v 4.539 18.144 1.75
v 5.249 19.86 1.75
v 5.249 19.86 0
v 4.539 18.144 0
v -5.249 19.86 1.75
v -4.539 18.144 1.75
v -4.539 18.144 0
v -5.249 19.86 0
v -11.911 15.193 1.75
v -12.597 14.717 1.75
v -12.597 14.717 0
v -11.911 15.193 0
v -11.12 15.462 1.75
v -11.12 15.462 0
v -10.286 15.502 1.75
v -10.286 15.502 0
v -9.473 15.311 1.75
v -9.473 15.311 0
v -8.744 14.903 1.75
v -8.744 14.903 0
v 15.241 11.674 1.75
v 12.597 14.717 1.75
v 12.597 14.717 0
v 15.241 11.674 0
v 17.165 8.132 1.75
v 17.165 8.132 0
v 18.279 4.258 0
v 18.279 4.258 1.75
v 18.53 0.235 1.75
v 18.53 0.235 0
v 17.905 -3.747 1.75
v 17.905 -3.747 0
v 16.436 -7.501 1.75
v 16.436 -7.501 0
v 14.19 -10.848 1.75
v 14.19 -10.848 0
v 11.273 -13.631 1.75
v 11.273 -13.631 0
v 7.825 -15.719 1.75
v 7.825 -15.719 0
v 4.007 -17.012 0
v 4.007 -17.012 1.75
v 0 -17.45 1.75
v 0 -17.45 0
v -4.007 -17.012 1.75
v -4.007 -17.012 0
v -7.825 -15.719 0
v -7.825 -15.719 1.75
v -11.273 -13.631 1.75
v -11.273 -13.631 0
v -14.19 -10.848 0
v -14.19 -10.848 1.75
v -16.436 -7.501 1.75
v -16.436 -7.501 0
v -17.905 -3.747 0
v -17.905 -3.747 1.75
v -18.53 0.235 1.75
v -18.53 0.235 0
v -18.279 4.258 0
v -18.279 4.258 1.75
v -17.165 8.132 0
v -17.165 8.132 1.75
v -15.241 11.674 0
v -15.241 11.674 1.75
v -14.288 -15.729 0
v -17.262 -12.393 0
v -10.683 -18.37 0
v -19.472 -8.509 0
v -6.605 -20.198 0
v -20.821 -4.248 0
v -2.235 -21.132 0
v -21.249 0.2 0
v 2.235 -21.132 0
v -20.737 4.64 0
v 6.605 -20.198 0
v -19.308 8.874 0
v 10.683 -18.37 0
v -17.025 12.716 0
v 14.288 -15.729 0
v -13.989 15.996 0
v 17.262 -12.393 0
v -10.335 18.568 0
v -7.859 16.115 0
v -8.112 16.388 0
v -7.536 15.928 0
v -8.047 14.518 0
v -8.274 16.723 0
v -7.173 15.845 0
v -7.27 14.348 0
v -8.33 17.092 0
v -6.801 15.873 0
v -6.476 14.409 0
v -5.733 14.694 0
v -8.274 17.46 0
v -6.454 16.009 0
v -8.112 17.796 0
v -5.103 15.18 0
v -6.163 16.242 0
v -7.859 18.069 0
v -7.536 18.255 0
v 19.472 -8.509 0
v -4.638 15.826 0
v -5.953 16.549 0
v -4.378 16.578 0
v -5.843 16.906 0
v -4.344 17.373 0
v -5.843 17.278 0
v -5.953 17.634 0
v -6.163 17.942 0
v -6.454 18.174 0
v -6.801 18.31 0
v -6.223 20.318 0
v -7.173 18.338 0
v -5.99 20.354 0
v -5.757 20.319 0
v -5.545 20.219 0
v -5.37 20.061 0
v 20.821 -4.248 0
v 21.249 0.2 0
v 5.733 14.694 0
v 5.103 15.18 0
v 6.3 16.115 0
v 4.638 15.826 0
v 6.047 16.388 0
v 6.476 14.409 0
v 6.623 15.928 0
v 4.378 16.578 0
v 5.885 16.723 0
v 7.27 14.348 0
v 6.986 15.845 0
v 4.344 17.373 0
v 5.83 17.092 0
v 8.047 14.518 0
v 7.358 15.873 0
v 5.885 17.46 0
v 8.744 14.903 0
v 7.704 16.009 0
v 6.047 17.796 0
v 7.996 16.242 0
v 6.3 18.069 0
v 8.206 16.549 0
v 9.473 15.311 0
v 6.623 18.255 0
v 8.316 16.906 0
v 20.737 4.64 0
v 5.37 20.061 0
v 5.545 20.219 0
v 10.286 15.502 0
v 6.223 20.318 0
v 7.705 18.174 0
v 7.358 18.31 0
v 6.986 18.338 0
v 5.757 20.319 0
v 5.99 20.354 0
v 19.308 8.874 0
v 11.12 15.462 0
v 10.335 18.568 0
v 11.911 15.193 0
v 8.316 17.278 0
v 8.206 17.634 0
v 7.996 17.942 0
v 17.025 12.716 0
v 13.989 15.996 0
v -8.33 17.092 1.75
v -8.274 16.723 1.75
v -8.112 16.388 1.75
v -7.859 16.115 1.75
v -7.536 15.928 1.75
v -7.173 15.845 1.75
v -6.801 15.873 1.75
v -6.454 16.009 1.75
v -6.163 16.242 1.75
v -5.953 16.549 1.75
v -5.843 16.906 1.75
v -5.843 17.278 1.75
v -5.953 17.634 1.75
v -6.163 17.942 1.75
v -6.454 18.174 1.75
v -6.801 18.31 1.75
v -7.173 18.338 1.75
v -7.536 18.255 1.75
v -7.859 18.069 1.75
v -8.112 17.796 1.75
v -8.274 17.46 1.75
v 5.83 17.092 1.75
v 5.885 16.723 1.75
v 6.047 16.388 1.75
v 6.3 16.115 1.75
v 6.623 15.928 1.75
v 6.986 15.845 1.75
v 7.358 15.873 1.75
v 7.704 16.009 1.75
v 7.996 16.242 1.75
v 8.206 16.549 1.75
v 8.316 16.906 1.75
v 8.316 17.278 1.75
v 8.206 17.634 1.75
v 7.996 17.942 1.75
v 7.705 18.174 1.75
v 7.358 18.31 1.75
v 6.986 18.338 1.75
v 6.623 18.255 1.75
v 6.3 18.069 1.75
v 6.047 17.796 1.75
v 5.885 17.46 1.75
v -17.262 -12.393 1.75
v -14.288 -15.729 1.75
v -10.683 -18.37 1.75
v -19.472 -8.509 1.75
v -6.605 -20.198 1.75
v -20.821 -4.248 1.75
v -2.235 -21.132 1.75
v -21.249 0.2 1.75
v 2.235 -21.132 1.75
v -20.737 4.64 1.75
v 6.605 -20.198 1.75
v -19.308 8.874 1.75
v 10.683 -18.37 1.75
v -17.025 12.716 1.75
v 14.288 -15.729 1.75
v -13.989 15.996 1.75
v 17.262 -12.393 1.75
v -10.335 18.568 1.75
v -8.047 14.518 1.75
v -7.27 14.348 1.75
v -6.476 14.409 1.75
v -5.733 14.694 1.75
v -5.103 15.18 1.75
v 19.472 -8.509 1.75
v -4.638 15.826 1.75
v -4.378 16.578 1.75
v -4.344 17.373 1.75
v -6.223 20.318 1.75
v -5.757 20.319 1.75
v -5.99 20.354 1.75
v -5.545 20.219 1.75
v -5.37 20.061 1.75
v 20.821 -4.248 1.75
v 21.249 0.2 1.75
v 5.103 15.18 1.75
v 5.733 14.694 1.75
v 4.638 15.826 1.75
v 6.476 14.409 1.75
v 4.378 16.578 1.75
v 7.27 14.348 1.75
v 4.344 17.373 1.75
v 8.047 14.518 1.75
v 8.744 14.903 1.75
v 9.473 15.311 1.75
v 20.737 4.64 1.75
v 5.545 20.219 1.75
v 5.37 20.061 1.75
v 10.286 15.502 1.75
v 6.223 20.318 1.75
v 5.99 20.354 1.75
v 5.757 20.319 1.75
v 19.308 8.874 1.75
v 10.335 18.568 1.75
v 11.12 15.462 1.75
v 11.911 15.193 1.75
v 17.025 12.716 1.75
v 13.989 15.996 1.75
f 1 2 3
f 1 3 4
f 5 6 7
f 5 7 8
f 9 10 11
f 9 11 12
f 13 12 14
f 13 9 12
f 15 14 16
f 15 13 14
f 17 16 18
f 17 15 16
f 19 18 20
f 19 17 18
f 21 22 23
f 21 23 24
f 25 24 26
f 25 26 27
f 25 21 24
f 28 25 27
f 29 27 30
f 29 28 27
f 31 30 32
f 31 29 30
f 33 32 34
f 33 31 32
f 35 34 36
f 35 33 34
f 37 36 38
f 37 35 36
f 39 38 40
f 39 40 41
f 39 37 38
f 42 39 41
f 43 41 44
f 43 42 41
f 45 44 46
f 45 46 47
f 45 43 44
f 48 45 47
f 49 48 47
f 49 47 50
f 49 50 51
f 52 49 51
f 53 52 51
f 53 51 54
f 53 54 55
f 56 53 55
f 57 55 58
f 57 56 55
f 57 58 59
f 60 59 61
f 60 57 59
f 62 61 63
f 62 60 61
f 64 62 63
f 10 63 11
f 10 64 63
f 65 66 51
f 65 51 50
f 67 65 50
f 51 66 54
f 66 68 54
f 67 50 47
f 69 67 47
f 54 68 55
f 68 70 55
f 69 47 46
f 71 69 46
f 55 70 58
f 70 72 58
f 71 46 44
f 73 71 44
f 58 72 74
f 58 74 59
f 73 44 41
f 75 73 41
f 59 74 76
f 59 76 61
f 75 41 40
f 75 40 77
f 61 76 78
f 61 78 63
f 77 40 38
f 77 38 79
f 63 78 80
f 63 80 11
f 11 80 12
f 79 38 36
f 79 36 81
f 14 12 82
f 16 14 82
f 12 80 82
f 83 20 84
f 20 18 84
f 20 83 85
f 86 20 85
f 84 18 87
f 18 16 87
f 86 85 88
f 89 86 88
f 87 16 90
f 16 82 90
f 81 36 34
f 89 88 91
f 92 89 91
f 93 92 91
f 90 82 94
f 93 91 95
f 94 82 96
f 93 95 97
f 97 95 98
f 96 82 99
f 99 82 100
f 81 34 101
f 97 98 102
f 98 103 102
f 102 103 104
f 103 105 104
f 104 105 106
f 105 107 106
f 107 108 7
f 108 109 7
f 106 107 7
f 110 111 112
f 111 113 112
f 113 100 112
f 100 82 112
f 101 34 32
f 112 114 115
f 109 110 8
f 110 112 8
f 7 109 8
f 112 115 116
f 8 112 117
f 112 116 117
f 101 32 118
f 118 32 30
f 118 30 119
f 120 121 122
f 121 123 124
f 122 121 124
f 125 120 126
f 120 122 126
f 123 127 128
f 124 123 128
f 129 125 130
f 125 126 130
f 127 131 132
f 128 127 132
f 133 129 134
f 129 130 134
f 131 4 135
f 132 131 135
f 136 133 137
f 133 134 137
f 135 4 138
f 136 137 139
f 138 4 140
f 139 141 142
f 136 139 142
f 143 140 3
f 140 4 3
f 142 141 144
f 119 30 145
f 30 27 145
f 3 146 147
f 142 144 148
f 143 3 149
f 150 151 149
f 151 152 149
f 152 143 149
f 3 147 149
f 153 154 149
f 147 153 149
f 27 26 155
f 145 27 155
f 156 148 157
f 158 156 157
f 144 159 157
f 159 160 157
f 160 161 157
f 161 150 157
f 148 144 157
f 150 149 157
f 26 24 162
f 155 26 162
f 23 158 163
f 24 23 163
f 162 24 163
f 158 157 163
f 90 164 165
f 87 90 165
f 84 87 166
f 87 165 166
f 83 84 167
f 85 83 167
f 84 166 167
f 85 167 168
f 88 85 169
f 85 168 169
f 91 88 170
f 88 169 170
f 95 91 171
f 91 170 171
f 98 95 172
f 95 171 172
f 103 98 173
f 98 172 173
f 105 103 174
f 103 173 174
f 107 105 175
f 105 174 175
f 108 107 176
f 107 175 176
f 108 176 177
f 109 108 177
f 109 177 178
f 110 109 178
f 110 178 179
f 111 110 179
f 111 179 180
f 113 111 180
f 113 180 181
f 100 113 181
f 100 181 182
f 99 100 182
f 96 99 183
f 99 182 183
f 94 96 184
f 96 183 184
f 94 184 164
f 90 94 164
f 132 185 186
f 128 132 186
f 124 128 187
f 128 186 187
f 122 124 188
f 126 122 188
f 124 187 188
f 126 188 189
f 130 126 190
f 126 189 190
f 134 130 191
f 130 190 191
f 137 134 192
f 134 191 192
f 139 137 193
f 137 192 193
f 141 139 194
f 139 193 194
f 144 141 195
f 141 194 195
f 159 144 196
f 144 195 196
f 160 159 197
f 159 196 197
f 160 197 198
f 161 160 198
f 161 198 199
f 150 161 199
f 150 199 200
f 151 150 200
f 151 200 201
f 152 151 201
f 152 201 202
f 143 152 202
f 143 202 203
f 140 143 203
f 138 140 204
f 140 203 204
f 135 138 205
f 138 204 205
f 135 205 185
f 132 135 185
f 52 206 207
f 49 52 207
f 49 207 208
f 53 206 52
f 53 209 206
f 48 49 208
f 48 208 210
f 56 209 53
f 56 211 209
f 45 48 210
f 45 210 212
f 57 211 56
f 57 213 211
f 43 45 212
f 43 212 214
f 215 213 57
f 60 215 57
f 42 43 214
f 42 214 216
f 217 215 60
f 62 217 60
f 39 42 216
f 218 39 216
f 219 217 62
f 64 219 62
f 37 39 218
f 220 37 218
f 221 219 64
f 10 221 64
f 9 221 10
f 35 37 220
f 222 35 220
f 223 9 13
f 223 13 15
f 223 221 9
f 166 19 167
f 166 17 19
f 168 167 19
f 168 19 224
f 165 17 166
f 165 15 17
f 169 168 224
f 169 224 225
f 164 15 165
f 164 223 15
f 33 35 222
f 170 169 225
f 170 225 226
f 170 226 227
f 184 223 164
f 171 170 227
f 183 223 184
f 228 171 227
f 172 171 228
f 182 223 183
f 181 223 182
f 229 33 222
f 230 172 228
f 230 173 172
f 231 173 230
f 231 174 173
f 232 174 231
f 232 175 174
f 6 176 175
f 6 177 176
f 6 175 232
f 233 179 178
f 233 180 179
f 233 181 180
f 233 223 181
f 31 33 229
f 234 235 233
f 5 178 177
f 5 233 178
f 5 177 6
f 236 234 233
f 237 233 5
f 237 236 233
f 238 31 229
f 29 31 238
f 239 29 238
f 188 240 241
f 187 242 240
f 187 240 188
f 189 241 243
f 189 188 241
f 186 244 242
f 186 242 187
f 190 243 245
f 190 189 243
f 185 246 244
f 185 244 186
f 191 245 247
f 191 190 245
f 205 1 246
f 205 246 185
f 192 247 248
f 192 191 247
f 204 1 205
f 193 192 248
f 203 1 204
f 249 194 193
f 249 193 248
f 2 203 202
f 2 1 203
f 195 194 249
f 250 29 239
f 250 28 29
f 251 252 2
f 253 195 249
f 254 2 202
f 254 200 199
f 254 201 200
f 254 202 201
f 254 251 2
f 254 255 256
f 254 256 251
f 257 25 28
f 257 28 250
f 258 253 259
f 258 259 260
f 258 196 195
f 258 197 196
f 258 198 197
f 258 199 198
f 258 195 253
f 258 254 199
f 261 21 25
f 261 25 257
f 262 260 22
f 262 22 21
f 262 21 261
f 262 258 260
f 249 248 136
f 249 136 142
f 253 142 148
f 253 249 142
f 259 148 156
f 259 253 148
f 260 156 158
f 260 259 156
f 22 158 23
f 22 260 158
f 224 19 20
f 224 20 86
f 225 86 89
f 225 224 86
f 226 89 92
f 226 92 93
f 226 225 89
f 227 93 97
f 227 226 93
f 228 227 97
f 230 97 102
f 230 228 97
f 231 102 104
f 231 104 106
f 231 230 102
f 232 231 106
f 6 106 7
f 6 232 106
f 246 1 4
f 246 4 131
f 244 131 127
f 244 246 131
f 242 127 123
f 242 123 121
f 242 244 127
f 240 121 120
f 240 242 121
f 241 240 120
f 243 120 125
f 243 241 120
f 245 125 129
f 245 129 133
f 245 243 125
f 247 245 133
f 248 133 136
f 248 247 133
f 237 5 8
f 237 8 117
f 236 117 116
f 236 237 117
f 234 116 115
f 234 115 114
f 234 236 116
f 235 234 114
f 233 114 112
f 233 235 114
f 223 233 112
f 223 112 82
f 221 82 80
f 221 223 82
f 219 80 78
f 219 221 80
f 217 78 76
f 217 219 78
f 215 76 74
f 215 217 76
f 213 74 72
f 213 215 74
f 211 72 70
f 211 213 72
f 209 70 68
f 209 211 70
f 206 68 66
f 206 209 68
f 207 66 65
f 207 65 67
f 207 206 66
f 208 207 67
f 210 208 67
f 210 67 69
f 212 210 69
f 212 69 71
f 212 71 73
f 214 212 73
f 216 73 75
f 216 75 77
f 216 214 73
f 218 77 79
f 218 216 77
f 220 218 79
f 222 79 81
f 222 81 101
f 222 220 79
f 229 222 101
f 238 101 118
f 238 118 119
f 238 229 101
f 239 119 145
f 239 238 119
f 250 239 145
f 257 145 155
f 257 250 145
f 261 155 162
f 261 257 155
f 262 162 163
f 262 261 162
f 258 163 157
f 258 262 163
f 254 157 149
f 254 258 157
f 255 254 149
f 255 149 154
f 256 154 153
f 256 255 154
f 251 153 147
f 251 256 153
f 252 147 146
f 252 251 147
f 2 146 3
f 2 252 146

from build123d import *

# Parameters (mm, degrees)
CROQUIS1_R              = 1.25
SALIENTE_EXTRUIR1_DEPTH = 1.75


with BuildPart() as part:
    # Croquis1 → Saliente-Extruir1 (new body)
    with BuildSketch(Plane.XY.offset(1.75)):
        with BuildLine():
            Line((5.249381166, 19.859670123), (4.53882245, 18.144188898))
            ThreePointArc((4.53882245, 18.144188898), (5.400610321, 14.913797401), (8.743959767, 14.902750233))
            ThreePointArc((8.743959767, 14.902750233), (10.704311129, 15.511176573), (12.596981786, 14.716848016))
            ThreePointArc((12.596981786, 14.716848016), (0, -17.45), (-12.596981786, 14.716848016))
            ThreePointArc((-12.596981786, 14.716848016), (-10.704311129, 15.511176573), (-8.743959767, 14.902750233))
            ThreePointArc((-8.743959767, 14.902750233), (-5.400610321, 14.913797401), (-4.53882245, 18.144188898))
            Line((-4.53882245, 18.144188898), (-5.249381166, 19.859670123))
            ThreePointArc((-5.249381166, 19.859670123), (-5.64740484, 20.277175016), (-6.222755816, 20.318459835))
            ThreePointArc((-6.222755816, 20.318459835), (0, -21.25), (6.222755816, 20.318459835))
            ThreePointArc((6.222755816, 20.318459835), (5.64740484, 20.277175016), (5.249381166, 19.859670123))
        make_face()
        with Locations(Location((-7.0795, 17.09183079, 0), (0, 0, 180))):
            Circle(CROQUIS1_R, mode=Mode.SUBTRACT)
        with Locations(Location((7.0795, 17.09183079, 0), (0, 0, 180))):
            Circle(CROQUIS1_R, mode=Mode.SUBTRACT)
    extrude(amount=-SALIENTE_EXTRUIR1_DEPTH)


solid = part.part
